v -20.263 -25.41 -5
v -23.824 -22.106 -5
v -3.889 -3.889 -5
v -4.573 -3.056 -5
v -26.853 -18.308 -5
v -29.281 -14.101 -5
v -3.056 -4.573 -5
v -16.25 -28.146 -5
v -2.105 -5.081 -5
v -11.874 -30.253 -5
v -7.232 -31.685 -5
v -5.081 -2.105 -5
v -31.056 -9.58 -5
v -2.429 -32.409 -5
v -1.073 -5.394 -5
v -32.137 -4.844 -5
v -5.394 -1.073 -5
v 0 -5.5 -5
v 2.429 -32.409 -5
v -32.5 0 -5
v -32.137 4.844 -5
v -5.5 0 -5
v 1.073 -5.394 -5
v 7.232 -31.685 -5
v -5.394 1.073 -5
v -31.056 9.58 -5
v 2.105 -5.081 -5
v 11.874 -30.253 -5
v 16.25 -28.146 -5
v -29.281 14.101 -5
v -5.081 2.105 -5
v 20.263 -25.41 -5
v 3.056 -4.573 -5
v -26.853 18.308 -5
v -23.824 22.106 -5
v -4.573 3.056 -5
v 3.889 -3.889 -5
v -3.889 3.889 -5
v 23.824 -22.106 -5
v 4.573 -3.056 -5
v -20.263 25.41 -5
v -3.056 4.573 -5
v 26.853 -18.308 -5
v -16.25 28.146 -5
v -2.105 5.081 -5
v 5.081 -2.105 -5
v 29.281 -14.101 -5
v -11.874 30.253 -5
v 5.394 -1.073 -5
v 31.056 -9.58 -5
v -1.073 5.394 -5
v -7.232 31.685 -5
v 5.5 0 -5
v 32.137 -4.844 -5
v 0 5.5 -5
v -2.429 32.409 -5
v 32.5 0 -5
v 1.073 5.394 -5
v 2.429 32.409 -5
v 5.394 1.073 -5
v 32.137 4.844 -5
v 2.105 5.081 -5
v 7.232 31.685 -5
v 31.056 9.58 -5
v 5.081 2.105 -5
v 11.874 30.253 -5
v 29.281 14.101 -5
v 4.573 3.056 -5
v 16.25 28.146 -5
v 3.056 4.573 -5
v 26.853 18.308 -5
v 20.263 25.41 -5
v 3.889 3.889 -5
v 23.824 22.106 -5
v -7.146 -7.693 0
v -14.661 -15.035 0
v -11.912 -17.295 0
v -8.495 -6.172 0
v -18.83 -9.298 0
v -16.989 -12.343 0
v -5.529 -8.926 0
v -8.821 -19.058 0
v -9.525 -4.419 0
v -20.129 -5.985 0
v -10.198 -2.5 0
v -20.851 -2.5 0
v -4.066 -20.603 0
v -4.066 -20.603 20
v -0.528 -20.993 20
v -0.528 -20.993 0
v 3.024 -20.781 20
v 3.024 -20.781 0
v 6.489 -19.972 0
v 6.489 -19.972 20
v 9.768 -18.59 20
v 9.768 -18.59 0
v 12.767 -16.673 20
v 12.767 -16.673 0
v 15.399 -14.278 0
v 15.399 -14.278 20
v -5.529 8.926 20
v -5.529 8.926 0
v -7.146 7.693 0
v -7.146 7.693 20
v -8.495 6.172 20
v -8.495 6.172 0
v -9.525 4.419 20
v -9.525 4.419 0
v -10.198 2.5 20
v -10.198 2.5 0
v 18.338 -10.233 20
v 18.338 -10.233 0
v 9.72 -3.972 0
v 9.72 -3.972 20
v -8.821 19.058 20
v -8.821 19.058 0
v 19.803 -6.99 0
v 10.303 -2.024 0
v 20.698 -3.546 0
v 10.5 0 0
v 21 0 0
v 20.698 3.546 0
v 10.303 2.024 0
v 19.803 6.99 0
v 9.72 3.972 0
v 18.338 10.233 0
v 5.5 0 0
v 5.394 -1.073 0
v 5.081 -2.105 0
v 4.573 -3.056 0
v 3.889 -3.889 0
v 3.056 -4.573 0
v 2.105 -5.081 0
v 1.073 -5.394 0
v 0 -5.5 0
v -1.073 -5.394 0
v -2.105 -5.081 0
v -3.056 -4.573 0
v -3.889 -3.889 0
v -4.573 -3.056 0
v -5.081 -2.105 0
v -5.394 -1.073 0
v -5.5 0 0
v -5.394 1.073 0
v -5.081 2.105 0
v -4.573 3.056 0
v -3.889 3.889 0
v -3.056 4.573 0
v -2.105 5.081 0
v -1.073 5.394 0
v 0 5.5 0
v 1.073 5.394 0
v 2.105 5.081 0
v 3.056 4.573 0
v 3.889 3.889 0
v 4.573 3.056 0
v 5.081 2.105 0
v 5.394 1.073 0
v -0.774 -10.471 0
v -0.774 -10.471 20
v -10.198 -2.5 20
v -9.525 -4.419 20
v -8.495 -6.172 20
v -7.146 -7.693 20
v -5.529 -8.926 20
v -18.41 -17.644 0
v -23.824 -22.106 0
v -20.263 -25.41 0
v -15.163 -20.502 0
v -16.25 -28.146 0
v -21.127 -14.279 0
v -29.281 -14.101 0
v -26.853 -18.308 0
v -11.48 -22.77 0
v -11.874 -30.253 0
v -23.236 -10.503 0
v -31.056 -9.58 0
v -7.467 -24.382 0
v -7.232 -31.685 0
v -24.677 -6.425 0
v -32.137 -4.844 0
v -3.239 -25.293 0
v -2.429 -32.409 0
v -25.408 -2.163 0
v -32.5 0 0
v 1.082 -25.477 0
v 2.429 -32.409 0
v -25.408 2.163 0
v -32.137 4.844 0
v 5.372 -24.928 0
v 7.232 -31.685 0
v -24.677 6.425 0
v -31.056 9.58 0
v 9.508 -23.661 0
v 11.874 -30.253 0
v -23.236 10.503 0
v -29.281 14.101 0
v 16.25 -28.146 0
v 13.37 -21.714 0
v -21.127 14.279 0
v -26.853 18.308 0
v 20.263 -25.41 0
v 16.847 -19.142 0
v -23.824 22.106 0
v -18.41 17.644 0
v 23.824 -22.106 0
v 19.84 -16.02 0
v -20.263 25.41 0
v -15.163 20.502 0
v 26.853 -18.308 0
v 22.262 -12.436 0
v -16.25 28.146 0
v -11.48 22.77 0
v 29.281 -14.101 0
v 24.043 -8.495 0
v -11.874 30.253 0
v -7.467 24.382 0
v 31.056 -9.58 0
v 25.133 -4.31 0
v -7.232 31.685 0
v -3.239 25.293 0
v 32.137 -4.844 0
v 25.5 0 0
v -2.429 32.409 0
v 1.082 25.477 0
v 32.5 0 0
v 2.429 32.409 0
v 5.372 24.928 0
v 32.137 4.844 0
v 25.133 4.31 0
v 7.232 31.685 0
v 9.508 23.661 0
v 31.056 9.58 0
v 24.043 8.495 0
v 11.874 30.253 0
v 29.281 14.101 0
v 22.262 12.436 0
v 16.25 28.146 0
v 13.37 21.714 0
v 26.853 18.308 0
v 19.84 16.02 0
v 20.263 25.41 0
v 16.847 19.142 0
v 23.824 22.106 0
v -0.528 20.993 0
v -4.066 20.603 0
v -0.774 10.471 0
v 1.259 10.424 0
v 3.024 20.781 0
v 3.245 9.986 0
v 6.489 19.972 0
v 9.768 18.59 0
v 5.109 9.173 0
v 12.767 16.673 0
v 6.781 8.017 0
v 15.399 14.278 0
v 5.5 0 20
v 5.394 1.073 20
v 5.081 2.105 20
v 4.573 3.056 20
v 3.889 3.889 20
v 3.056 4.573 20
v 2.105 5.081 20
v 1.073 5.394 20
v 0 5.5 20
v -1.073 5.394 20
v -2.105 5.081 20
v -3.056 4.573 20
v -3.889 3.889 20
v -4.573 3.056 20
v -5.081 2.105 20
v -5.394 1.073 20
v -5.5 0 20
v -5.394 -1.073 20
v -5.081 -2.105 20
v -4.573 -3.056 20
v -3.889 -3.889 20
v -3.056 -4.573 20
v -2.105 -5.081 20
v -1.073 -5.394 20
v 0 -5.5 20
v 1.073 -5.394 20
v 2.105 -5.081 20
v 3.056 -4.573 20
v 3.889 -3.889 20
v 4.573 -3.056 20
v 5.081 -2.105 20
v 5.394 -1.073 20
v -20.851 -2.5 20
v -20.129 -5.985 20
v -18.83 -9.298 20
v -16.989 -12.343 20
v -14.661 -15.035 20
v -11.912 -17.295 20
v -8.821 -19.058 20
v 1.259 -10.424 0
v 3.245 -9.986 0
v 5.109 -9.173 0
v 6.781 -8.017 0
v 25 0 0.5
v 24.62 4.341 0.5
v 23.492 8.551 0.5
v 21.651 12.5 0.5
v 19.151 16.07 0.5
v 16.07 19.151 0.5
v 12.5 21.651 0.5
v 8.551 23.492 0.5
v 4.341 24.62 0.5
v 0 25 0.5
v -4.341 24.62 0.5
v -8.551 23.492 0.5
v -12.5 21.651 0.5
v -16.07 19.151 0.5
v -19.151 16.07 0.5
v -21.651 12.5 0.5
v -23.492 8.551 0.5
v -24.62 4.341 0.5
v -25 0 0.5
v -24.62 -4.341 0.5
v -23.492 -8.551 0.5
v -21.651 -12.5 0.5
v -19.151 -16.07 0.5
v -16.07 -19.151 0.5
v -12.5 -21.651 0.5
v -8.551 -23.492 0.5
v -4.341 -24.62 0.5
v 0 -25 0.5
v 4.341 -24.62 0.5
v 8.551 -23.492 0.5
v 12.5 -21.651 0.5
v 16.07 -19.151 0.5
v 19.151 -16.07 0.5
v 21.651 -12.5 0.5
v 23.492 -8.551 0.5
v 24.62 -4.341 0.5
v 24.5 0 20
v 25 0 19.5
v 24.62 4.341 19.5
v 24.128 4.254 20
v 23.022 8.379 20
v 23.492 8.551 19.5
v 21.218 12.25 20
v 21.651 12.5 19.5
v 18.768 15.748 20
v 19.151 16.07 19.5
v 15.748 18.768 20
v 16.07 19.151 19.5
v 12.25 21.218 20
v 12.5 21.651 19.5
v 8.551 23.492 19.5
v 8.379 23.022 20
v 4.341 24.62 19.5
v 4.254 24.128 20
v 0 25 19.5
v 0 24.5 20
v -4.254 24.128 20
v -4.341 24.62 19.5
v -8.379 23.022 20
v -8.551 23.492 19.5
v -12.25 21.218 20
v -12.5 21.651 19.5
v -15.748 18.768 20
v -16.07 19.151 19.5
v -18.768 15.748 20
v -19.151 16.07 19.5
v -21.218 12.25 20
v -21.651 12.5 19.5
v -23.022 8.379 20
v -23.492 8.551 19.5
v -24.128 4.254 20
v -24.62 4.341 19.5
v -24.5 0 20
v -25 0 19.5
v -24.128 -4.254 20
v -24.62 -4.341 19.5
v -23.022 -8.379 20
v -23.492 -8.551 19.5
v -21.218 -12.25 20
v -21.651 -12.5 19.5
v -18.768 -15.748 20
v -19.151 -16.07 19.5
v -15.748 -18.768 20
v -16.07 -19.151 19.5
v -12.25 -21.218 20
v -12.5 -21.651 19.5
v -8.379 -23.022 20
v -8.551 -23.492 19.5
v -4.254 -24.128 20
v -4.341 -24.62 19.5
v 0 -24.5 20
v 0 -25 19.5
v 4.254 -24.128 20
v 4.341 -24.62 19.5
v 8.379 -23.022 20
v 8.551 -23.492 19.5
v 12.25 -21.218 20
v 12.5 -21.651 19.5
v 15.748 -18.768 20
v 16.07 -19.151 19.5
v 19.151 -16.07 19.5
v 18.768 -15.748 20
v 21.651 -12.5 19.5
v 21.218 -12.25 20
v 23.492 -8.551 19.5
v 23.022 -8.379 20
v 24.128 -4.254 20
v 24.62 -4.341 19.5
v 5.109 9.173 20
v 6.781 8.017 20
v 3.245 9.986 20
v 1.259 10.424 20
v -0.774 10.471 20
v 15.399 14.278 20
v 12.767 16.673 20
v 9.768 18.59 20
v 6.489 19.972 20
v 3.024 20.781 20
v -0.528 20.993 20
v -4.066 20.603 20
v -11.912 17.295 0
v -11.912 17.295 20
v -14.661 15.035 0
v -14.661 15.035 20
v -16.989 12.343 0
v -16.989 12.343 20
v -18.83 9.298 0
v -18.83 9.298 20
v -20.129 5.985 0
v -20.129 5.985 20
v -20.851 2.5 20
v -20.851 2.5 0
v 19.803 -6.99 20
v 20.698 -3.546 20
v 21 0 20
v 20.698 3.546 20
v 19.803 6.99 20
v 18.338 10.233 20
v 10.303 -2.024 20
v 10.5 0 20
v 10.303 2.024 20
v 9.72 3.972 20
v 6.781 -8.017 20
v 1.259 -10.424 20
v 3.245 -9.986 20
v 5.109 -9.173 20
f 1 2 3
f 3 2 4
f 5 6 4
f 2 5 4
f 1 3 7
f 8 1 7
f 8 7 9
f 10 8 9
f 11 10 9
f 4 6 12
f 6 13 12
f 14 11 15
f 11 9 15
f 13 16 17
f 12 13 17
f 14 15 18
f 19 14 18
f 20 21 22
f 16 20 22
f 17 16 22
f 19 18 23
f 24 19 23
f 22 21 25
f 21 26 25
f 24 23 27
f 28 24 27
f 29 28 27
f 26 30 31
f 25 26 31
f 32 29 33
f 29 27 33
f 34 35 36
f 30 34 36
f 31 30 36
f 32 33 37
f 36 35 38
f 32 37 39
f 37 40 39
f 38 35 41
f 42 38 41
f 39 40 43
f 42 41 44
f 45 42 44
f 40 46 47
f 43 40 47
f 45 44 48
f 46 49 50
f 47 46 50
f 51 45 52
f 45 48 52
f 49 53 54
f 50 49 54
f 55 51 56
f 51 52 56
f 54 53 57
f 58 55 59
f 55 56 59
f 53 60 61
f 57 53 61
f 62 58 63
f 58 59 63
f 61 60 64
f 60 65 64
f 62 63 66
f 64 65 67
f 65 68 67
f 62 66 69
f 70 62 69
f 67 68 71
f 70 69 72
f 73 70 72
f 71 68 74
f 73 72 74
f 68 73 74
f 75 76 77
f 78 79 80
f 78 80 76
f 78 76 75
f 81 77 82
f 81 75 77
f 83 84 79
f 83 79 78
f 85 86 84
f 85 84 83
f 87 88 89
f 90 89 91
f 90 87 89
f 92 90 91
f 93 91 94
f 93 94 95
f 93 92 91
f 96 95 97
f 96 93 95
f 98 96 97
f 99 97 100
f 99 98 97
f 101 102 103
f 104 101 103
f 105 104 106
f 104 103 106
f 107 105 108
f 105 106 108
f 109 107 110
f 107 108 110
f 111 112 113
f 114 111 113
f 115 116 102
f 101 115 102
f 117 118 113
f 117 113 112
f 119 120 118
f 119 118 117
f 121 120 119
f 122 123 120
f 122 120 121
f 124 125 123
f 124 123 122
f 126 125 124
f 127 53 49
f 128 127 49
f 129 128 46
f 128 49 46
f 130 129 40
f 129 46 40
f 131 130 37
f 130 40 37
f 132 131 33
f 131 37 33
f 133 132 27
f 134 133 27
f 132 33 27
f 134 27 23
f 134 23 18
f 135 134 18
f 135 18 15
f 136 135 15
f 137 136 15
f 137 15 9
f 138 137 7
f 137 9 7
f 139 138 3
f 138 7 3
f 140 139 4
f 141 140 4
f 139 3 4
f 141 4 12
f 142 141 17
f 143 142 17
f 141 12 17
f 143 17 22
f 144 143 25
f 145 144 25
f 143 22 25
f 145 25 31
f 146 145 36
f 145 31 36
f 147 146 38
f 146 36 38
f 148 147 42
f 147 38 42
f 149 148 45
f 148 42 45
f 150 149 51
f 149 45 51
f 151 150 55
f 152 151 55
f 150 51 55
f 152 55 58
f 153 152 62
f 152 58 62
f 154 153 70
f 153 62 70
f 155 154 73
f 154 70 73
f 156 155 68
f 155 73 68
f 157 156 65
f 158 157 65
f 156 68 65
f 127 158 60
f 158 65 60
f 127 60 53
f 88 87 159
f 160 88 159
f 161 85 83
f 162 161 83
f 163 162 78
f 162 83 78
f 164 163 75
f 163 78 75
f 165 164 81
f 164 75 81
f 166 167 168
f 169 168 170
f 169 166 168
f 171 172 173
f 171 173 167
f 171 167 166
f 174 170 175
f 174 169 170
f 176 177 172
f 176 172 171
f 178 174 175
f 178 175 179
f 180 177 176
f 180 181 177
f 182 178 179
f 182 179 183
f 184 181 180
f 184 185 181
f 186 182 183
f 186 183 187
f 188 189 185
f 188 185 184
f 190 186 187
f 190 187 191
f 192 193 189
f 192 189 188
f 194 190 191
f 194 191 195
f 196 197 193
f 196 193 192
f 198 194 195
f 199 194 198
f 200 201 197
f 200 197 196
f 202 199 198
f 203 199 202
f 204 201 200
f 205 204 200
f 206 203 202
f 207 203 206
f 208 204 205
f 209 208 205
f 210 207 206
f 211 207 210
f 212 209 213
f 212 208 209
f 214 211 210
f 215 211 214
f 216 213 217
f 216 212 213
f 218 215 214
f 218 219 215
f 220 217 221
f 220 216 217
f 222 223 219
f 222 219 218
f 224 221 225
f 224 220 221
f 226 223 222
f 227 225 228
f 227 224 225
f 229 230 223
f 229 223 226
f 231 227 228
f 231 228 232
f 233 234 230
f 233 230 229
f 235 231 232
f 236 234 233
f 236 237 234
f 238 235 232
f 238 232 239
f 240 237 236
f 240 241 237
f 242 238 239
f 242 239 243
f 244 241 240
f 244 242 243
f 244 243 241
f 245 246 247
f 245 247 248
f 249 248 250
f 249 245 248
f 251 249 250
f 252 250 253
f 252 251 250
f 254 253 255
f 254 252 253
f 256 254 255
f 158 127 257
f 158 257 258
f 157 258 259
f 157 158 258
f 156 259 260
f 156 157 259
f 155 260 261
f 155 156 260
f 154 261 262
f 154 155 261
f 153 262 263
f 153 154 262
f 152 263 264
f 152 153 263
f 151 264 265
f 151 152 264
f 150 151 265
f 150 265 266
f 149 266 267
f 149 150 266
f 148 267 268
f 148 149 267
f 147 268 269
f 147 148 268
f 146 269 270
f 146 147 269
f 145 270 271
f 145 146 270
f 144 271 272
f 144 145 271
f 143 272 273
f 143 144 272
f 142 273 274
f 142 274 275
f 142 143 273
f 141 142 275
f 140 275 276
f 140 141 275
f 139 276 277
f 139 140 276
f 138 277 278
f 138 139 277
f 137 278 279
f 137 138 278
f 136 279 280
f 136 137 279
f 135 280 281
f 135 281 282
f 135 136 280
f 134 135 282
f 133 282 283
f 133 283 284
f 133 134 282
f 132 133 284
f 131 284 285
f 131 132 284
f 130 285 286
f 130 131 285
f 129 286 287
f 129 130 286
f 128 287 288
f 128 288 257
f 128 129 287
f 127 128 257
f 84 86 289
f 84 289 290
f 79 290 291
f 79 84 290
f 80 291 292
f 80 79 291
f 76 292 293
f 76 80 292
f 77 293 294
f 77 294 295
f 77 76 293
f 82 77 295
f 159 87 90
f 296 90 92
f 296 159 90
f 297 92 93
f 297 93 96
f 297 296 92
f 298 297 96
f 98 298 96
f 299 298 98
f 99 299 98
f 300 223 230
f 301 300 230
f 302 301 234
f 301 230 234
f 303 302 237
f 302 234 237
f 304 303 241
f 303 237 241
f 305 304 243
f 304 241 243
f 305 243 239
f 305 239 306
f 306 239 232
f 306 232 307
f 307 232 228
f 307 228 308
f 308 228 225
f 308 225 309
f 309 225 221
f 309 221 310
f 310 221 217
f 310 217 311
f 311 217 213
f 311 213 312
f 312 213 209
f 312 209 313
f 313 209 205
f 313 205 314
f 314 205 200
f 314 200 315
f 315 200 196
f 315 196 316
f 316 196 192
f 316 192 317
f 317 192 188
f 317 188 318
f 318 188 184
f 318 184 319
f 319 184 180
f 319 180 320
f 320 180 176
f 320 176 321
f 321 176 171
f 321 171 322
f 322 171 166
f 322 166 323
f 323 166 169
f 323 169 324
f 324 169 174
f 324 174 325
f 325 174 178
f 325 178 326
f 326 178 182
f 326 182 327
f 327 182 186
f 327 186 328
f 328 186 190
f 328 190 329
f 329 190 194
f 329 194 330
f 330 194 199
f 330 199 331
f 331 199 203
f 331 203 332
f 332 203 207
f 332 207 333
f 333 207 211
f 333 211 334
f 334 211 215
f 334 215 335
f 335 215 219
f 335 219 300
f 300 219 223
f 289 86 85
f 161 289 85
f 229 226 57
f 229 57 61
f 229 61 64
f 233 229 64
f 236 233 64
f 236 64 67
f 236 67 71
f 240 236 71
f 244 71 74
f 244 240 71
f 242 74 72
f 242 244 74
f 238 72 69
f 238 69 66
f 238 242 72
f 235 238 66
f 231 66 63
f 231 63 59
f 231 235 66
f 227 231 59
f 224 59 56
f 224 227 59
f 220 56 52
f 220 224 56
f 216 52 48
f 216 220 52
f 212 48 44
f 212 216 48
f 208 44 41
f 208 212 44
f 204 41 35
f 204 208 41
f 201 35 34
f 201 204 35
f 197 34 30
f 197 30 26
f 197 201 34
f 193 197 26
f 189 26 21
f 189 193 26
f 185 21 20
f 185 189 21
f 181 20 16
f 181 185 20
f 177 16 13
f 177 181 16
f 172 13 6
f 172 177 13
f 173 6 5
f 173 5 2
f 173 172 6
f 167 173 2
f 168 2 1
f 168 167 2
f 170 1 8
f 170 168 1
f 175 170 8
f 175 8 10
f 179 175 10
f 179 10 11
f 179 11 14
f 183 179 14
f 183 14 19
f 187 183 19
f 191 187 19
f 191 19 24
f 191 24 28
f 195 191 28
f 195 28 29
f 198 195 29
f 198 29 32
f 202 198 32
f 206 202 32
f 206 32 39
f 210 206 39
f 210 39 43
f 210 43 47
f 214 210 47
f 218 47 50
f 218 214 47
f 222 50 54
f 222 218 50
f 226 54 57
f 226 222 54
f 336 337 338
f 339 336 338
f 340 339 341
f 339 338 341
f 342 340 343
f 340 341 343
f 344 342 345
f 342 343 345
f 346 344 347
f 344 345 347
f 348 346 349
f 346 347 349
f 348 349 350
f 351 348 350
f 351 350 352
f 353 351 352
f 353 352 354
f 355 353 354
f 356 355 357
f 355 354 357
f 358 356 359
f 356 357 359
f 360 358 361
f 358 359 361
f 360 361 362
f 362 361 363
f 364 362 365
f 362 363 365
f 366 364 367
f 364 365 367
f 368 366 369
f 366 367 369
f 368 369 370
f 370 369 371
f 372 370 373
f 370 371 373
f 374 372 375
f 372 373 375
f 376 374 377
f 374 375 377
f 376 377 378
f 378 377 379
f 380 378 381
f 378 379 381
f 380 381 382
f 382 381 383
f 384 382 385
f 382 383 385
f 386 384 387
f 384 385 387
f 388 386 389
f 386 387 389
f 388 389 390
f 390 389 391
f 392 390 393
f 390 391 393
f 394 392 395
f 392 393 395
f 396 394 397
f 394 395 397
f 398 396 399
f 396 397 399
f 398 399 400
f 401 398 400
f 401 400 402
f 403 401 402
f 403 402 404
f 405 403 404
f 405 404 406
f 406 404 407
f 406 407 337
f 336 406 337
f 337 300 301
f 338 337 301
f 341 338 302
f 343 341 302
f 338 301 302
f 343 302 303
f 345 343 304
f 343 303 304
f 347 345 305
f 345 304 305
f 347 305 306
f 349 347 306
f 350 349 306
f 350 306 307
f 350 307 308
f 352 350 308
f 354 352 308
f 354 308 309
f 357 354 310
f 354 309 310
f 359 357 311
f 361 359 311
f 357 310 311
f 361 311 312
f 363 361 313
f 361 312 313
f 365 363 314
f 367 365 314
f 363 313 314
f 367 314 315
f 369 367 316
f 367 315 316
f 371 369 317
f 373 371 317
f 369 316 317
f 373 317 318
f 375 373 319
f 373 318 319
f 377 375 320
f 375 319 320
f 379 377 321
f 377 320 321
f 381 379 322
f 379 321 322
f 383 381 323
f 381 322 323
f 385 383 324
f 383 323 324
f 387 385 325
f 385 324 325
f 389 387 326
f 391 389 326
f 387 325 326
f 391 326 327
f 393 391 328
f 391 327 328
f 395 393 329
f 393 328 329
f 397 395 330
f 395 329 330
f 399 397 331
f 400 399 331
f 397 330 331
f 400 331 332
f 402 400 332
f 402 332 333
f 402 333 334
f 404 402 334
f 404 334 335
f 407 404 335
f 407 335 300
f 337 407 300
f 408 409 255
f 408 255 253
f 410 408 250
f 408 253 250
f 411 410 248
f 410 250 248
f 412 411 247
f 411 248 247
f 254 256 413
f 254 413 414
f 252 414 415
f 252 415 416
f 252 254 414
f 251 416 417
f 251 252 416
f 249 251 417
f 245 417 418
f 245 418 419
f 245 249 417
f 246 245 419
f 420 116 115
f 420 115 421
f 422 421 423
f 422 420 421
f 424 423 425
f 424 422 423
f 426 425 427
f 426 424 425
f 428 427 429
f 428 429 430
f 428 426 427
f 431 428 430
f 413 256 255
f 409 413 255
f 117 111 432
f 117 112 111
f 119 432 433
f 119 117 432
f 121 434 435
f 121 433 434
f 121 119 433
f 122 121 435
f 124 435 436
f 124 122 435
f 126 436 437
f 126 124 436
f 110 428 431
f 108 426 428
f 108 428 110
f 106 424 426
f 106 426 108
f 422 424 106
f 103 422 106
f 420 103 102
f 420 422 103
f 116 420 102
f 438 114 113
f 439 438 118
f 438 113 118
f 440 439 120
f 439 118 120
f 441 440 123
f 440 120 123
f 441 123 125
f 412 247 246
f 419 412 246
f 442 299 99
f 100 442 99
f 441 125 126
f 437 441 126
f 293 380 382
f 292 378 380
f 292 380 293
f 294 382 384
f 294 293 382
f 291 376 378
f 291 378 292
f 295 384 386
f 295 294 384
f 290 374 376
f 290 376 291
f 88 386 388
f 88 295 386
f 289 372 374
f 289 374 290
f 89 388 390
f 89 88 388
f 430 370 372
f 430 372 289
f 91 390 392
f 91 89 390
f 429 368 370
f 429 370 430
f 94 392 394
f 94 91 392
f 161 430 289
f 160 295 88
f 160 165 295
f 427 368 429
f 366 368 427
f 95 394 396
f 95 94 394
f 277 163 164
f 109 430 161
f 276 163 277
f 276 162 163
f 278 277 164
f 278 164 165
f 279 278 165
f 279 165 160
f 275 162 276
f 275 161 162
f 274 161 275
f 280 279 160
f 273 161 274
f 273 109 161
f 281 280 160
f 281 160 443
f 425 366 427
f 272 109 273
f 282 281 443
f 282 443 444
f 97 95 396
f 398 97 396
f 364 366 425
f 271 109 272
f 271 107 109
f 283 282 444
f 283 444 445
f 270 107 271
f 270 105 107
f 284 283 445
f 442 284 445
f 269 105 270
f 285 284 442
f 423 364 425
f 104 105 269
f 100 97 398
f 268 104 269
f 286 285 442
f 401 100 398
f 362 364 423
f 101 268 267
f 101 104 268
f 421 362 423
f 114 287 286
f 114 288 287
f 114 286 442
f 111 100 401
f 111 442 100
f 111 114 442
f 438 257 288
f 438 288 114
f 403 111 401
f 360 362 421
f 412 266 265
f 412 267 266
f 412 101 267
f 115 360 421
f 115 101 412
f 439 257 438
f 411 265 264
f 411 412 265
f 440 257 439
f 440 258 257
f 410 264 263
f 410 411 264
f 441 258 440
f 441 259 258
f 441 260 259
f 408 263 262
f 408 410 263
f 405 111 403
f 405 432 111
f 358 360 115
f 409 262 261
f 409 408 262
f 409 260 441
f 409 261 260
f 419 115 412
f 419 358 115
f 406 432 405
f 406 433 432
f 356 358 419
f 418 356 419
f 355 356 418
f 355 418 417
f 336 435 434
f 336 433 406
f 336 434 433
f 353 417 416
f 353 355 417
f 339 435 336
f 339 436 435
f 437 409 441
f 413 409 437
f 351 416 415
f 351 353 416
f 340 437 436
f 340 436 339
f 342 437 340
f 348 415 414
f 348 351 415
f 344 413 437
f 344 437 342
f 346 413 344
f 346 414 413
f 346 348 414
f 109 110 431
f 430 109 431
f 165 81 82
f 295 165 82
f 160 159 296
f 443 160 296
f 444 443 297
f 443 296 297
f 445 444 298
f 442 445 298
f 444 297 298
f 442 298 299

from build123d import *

# Parameters (mm, degrees)
F0_R     = 25
F0_R_2   = 21
F1_DEPTH = 20
F2_R     = 32.5
F3_DEPTH = 5
F4_R     = 5.5
F5_DEPTH = 5
F6_R     = 10.5
F6_R_2   = 5.5
F7_DEPTH = 20
F9_DEPTH = 20
F10_SIZE = 0.5


with BuildPart() as f1:
    # F0 (on Top) → F1 (new body)
    with BuildSketch(Plane.XY):
        Circle(F0_R)
        Circle(F0_R_2, mode=Mode.SUBTRACT)
    extrude(amount=F1_DEPTH)

    # F2 (on Top) → F3 (join)
    with BuildSketch(Plane.XY):
        Circle(F2_R)
    extrude(amount=-F3_DEPTH)

    # F4 (on face) → F5 (cut, through all)
    with BuildSketch(Plane(origin=(0, 0, -5), x_dir=(1, 0, 0), z_dir=(0, 0, -1))):
        Circle(F4_R)
    extrude(amount=-F5_DEPTH, mode=Mode.SUBTRACT)

    # F6 (on face) → F7 (join)
    with BuildSketch(Plane.XY):
        Circle(F6_R)
        Circle(F6_R_2, mode=Mode.SUBTRACT)
    extrude(amount=F7_DEPTH)

    # F8 (on face) → F9 (join)
    with BuildSketch(Plane.XY):
        with BuildLine():
            Line((-5.5290086594, -8.9263689843), (-8.8208494084, -19.0576130644))
            ThreePointArc((-8.8208494084, -19.0576130644), (-6.4893568819, -19.9721868422), (-4.0655668269, -20.6026980363))
            Line((-4.0655668269, -20.6026980363), (-0.773726078, -10.4714539562))
            ThreePointArc((-0.773726078, -10.4714539562), (-3.2446784409, -9.9860934211), (-5.5290086594, -8.9263689843))
        make_face()
        with BuildLine():
            ThreePointArc((18.3380009794, 10.2331676464), (16.9893568819, 12.3434902981), (15.3990747179, 14.2782526183))
            Line((15.3990747179, 14.2782526183), (6.7809237516, 8.0167994284))
            ThreePointArc((6.7809237516, 8.0167994284), (8.4946784409, 6.1717451491), (9.719850013, 3.9717144565))
            Line((9.719850013, 3.9717144565), (18.3380009794, 10.2331676464))
        make_face()
        with BuildLine():
            Line((6.7809237516, -8.0167994284), (15.3990747179, -14.2782526183))
            ThreePointArc((15.3990747179, -14.2782526183), (16.9893568819, -12.3434902981), (18.3380009794, -10.2331676464))
            Line((18.3380009794, -10.2331676464), (9.719850013, -3.9717144565))
            ThreePointArc((9.719850013, -3.9717144565), (8.4946784409, -6.1717451491), (6.7809237516, -8.0167994284))
        make_face()
        with BuildLine():
            ThreePointArc((-4.0655668269, 20.6026980363), (-6.4893568819, 19.9721868422), (-8.8208494084, 19.0576130644))
            Line((-8.8208494084, 19.0576130644), (-5.5290086594, 8.9263689843))
            ThreePointArc((-5.5290086594, 8.9263689843), (-3.2446784409, 9.9860934211), (-0.773726078, 10.4714539562))
            Line((-0.773726078, 10.4714539562), (-4.0655668269, 20.6026980363))
        make_face()
        with BuildLine():
            Line((-10.1980390272, 2.5), (-20.850659462, 2.5))
            ThreePointArc((-20.850659462, 2.5), (-21, 0), (-20.850659462, -2.5))
            Line((-20.850659462, -2.5), (-10.1980390272, -2.5))
            ThreePointArc((-10.1980390272, -2.5), (-10.5, 0), (-10.1980390272, 2.5))
        make_face()
    extrude(amount=F9_DEPTH)

    # F10
    f10_edges = [f1.edges().sort_by_distance(p)[0] for p in [
        (25, 0, 10),
        (-25, 0, 0),
        (-25, 0, 20),
    ]]
    chamfer(f10_edges, length=F10_SIZE)


solid = f1.part
